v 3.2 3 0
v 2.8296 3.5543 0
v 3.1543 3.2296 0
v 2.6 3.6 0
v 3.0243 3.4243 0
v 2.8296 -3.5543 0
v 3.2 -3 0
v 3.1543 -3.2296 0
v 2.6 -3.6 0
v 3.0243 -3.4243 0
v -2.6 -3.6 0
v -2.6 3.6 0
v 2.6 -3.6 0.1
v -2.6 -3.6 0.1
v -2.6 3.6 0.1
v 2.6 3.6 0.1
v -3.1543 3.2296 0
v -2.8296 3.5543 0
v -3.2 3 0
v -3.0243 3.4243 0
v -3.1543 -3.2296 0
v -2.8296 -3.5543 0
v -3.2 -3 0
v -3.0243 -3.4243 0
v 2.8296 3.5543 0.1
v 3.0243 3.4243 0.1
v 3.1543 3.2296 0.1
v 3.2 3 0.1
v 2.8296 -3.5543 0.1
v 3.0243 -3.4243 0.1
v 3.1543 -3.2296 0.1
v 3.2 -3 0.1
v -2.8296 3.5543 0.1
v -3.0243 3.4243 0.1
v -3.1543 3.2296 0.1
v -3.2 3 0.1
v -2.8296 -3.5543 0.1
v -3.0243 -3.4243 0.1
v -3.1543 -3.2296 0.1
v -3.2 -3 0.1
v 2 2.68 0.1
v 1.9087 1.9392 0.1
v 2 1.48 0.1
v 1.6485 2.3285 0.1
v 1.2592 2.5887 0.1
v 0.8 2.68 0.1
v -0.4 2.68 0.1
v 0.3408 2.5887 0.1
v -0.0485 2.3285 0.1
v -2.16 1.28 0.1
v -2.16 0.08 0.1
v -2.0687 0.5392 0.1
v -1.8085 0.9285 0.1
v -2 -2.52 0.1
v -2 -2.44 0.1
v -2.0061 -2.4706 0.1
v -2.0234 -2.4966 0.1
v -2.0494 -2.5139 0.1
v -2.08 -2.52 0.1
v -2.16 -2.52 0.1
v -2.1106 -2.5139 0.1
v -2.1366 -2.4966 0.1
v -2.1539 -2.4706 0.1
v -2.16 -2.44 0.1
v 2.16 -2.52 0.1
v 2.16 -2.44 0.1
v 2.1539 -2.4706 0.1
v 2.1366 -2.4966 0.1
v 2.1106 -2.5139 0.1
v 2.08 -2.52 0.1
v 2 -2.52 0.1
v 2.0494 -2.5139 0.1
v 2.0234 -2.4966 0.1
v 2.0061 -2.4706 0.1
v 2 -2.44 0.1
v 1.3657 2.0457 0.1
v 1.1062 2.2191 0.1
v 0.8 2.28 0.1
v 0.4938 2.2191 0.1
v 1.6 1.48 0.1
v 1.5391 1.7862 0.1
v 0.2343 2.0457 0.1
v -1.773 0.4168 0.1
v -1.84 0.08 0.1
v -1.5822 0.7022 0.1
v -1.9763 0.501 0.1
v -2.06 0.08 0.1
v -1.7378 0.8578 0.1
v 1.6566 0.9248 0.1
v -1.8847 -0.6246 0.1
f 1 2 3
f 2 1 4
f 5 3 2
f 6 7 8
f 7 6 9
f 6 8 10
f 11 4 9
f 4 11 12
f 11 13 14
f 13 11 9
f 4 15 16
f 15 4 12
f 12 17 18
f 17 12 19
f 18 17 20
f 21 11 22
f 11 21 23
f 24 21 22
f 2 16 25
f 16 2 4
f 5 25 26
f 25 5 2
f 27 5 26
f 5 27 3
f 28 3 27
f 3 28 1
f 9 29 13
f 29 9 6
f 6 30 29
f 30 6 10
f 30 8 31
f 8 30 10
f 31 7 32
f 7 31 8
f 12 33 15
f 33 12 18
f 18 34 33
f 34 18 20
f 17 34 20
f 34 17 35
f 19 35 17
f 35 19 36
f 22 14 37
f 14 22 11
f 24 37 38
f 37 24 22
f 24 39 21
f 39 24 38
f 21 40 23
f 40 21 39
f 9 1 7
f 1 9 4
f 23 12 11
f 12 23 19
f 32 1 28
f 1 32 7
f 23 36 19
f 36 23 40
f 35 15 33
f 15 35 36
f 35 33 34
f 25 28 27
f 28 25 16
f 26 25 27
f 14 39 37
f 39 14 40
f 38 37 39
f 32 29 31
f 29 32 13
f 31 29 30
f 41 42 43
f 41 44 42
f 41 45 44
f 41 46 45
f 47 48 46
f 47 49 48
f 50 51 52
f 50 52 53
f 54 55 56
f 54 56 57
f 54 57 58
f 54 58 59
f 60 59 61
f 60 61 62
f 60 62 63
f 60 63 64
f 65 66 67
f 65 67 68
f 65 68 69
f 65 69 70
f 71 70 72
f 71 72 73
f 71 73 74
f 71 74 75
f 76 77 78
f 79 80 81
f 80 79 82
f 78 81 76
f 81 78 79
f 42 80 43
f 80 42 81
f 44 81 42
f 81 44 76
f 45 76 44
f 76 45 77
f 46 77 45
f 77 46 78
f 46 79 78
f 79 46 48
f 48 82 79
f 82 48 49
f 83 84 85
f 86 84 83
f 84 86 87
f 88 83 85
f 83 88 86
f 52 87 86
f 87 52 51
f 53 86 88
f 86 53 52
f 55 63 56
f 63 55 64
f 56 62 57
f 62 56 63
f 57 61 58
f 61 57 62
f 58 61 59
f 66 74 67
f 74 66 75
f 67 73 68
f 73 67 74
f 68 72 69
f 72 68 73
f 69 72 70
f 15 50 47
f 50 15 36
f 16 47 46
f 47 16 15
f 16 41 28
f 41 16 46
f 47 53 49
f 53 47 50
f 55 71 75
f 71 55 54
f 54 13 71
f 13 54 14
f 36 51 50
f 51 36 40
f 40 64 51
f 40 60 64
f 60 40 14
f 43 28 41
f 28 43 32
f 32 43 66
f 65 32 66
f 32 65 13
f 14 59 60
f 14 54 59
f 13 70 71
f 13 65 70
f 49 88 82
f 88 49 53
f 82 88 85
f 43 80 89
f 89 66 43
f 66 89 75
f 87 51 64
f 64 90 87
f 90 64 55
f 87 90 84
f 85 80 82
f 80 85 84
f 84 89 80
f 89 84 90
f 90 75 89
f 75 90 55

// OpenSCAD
// file: ../p/box3u12.scad
use <../lib.scad>
function ldraw_lib__box3u12() = [
// 0 Box with 3 Parallel Faces without Any Edges
// 0 Name: box3u12.dat
// 0 Author: J.C. Tchang [tchang]
// 0 !LDRAW_ORG Primitive UPDATE 2014-02
// 0 !LICENSE Licensed under CC BY 4.0 : see CAreadme.txt
// 
// 0 BFC CERTIFY CCW
  [0,"BFC","CERTIFY"],
  [0,"BFC","CCW"],
// 
// 0 !HISTORY 2014-12-23 [PTadmin] Official Update 2014-02
// 
// 
// 4 16 -1 1 1 1 1 1 1 1 -1 -1 1 -1
  [4,16,-1,1,1,1,1,1,1,1,-1,-1,1,-1],
// 4 16 -1 1 1 -1 0 1 1 0 1 1 1 1
  [4,16,-1,1,1,-1,0,1,1,0,1,1,1,1],
// 4 16 1 1 -1 1 0 -1 -1 0 -1 -1 1 -1
  [4,16,1,1,-1,1,0,-1,-1,0,-1,-1,1,-1],
];
module ldraw_lib__box3u12(step=0, col=false, unit=2/5, alt=false, line=0.2, solid=!$preview)
    makepoly(ldraw_lib__box3u12(), step=step, col=col, unit=unit, alt=alt, line=line, solid=solid);
ldraw_lib__box3u12(line=0.2);
// file: ../p/1-4cyli.scad
use <../lib.scad>
function ldraw_lib__1_4cyli() = [
// 0 Cylinder 0.25
// 0 Name: 1-4cyli.dat
// 0 Author: James Jessiman
// 0 !LDRAW_ORG Primitive UPDATE 2012-01
// 0 !LICENSE Licensed under CC BY 4.0 : see CAreadme.txt
// 
// 0 BFC CERTIFY CCW
  [0,"BFC","CERTIFY"],
  [0,"BFC","CCW"],
// 
// 0 !HISTORY 2002-03-23 [sbliss] Added BFC statement.
// 0 !HISTORY 2002-04-25 [PTadmin] Official Update 2002-02
// 0 !HISTORY 2007-06-22 [PTadmin] Header formatted for Contributor Agreement
// 0 !HISTORY 2008-07-01 [PTadmin] Official Update 2008-01
// 0 !HISTORY 2012-02-16 [Philo] Changed to CCW
// 0 !HISTORY 2012-03-30 [PTadmin] Official Update 2012-01
// 
// 
// 4 16 1 1 0 0.9239 1 0.3827 0.9239 0 0.3827 1 0 0
  [4,16,1,1,0,0.9239,1,0.3827,0.9239,0,0.3827,1,0,0],
// 5 24 1 0 0 1 1 0 0.9239 0 0.3827 1 0 -1
  [5,24,1,0,0,1,1,0,0.9239,0,0.3827,1,0,-1],
// 4 16 0.9239 1 0.3827 0.7071 1 0.7071 0.7071 0 0.7071 0.9239 0 0.3827
  [4,16,0.9239,1,0.3827,0.7071,1,0.7071,0.7071,0,0.7071,0.9239,0,0.3827],
// 5 24 0.9239 0 0.3827 0.9239 1 0.3827 0.7071 0 0.7071 1 0 0
  [5,24,0.9239,0,0.3827,0.9239,1,0.3827,0.7071,0,0.7071,1,0,0],
// 4 16 0.7071 1 0.7071 0.3827 1 0.9239 0.3827 0 0.9239 0.7071 0 0.7071
  [4,16,0.7071,1,0.7071,0.3827,1,0.9239,0.3827,0,0.9239,0.7071,0,0.7071],
// 5 24 0.7071 0 0.7071 0.7071 1 0.7071 0.3827 0 0.9239 0.9239 0 0.3827
  [5,24,0.7071,0,0.7071,0.7071,1,0.7071,0.3827,0,0.9239,0.9239,0,0.3827],
// 4 16 0.3827 1 0.9239 0 1 1 0 0 1 0.3827 0 0.9239
  [4,16,0.3827,1,0.9239,0,1,1,0,0,1,0.3827,0,0.9239],
// 5 24 0.3827 0 0.9239 0.3827 1 0.9239 0 0 1 0.7071 0 0.7071
  [5,24,0.3827,0,0.9239,0.3827,1,0.9239,0,0,1,0.7071,0,0.7071],
// 5 24 0 0 1 0 1 1 0.3827 0 0.9239 -1 0 1
  [5,24,0,0,1,0,1,1,0.3827,0,0.9239,-1,0,1],
];
module ldraw_lib__1_4cyli(step=0, col=false, unit=2/5, alt=false, line=0.2, solid=!$preview)
    makepoly(ldraw_lib__1_4cyli(), step=step, col=col, unit=unit, alt=alt, line=line, solid=solid);
ldraw_lib__1_4cyli(line=0.2);
// file: s/stickerback008x009.scad
use <../../lib.scad>
use <../../p/1-4chrd.scad>
use <../../p/1-4cyli.scad>
use <../../p/box3u12.scad>
function ldraw_lib__s__stickerback008x009() = [
// 0 ~Sticker Back  0.8 x  0.9
// 0 Name: s\stickerback008x009.dat
// 0 Author: Massimo Maso [Sirio]
// 0 !LDRAW_ORG Subpart UPDATE 2026-05
// 0 !LICENSE Licensed under CC BY 4.0 : see CAreadme.txt
// 
// 0 BFC CERTIFY CCW
  [0,"BFC","CERTIFY"],
  [0,"BFC","CCW"],
// 
// 0 !HISTORY 2025-08-31 [OrionP] Official Update 2025-08
// 0 !HISTORY 2026-04-18 [MagFors] corrected length
// 0 !HISTORY 2026-05-31 [OrionP] Official Update 2026-05
// 
// 0 // Primitives
// 1 16 -7.5 0 6.5 -1.5 0 0 0 -1 0 0 0 1.5 1-4chrd.dat
  [1,16,-7.5,0,6.5,-1.5,0,0,0,-1,0,0,0,1.5, ldraw_lib__1_4chrd()],
// 1 16 7.5 0 6.5 1.5 0 0 0 -1 0 0 0 1.5 1-4chrd.dat
  [1,16,7.5,0,6.5,1.5,0,0,0,-1,0,0,0,1.5, ldraw_lib__1_4chrd()],
// 1 16 0 -.25 0 0 0 9 0 .25 0 6.5 0 0 box3u12.dat
  [1,16,0,-.25,0,0,0,9,0,.25,0,6.5,0,0, ldraw_lib__box3u12()],
// 1 16 -7.5 0 -6.5 -1.5 0 0 0 -1 0 0 0 -1.5 1-4chrd.dat
  [1,16,-7.5,0,-6.5,-1.5,0,0,0,-1,0,0,0,-1.5, ldraw_lib__1_4chrd()],
// 1 16 7.5 0 -6.5 1.5 0 0 0 -1 0 0 0 -1.5 1-4chrd.dat
  [1,16,7.5,0,-6.5,1.5,0,0,0,-1,0,0,0,-1.5, ldraw_lib__1_4chrd()],
// 1 16 -7.5 0 6.5 -1.5 0 0 0 -.25 0 0 0 1.5 1-4cyli.dat
  [1,16,-7.5,0,6.5,-1.5,0,0,0,-.25,0,0,0,1.5, ldraw_lib__1_4cyli()],
// 1 16 7.5 0 6.5 1.5 0 0 0 -.25 0 0 0 1.5 1-4cyli.dat
  [1,16,7.5,0,6.5,1.5,0,0,0,-.25,0,0,0,1.5, ldraw_lib__1_4cyli()],
// 1 16 -7.5 0 -6.5 -1.5 0 0 0 -.25 0 0 0 -1.5 1-4cyli.dat
  [1,16,-7.5,0,-6.5,-1.5,0,0,0,-.25,0,0,0,-1.5, ldraw_lib__1_4cyli()],
// 1 16 7.5 0 -6.5 1.5 0 0 0 -.25 0 0 0 -1.5 1-4cyli.dat
  [1,16,7.5,0,-6.5,1.5,0,0,0,-.25,0,0,0,-1.5, ldraw_lib__1_4cyli()],
// 0 // Bottom face
// 4 16 -7.5 0 8 7.5 0 8 9 0 6.5 -9 0 6.5
  [4,16,-7.5,0,8,7.5,0,8,9,0,6.5,-9,0,6.5],
// 4 16 -7.5 0 -8 -9 0 -6.5 9 0 -6.5 7.5 0 -8
  [4,16,-7.5,0,-8,-9,0,-6.5,9,0,-6.5,7.5,0,-8],
// 0 // Lateral face
// 4 16 -7.5 0 8 -7.5 -.25 8 7.5 -.25 8 7.5 0 8
  [4,16,-7.5,0,8,-7.5,-.25,8,7.5,-.25,8,7.5,0,8],
// 4 16 -7.5 0 -8 7.5 0 -8 7.5 -.25 -8 -7.5 -.25 -8
  [4,16,-7.5,0,-8,7.5,0,-8,7.5,-.25,-8,-7.5,-.25,-8],
];
module ldraw_lib__s__stickerback008x009(step=0, col=false, unit=2/5, alt=false, line=0.2, solid=!$preview)
    makepoly(ldraw_lib__s__stickerback008x009(), step=step, col=col, unit=unit, alt=alt, line=line, solid=solid);
ldraw_lib__s__stickerback008x009(line=0.2);
// file: ../p/3-8ring2.scad
use <../lib.scad>
function ldraw_lib__3_8ring2() = [
// 0 Ring  2 x 0.375
// 0 Name: 3-8ring2.dat
// 0 Author: Willy Tschager [Holly-Wood]
// 0 !LDRAW_ORG Primitive UPDATE 2024-01
// 0 !LICENSE Licensed under CC BY 4.0 : see CAreadme.txt
// 
// 0 BFC CERTIFY CCW
  [0,"BFC","CERTIFY"],
  [0,"BFC","CCW"],
// 
// 0 !HISTORY 2005-12-28 [PTadmin] Official Update 2005-01
// 0 !HISTORY 2007-06-24 [PTadmin] Header formatted for Contributor Agreement
// 0 !HISTORY 2008-07-01 [PTadmin] Official Update 2008-01
// 0 !HISTORY 2024-01-11 [Holly-Wood] Complete regeneration, original by guyvivan
// 0 !HISTORY 2024-01-29 [OrionP] Official Update 2024-01
// 
// 4 16 3 0 0 2.7717 0 1.1481 1.8478 0 0.7654 2 0 0
  [4,16,3,0,0,2.7717,0,1.1481,1.8478,0,0.7654,2,0,0],
// 4 16 2.7717 0 1.1481 2.1213 0 2.1213 1.4142 0 1.4142 1.8478 0 0.7654
  [4,16,2.7717,0,1.1481,2.1213,0,2.1213,1.4142,0,1.4142,1.8478,0,0.7654],
// 4 16 2.1213 0 2.1213 1.1481 0 2.7717 0.7654 0 1.8478 1.4142 0 1.4142
  [4,16,2.1213,0,2.1213,1.1481,0,2.7717,0.7654,0,1.8478,1.4142,0,1.4142],
// 4 16 1.1481 0 2.7717 0 0 3 0 0 2 0.7654 0 1.8478
  [4,16,1.1481,0,2.7717,0,0,3,0,0,2,0.7654,0,1.8478],
// 4 16 0 0 3 -1.1481 0 2.7717 -0.7654 0 1.8478 0 0 2
  [4,16,0,0,3,-1.1481,0,2.7717,-0.7654,0,1.8478,0,0,2],
// 4 16 -1.1481 0 2.7717 -2.1213 0 2.1213 -1.4142 0 1.4142 -0.7654 0 1.8478
  [4,16,-1.1481,0,2.7717,-2.1213,0,2.1213,-1.4142,0,1.4142,-0.7654,0,1.8478],
// 0 // Build by LDPartEditor (PrimGen 2.X)
];
module ldraw_lib__3_8ring2(step=0, col=false, unit=2/5, alt=false, line=0.2, solid=!$preview)
    makepoly(ldraw_lib__3_8ring2(), step=step, col=col, unit=unit, alt=alt, line=line, solid=solid);
ldraw_lib__3_8ring2(line=0.2);
// file: ../p/3-8ndis.scad
use <../lib.scad>
function ldraw_lib__3_8ndis() = [
// 0 Disc Negative 0.375
// 0 Name: 3-8ndis.dat
// 0 Author: Alex Taylor [anathema]
// 0 !LDRAW_ORG Primitive UPDATE 2009-02
// 0 !LICENSE Licensed under CC BY 4.0 : see CAreadme.txt
// 
// 0 BFC CERTIFY CCW
  [0,"BFC","CERTIFY"],
  [0,"BFC","CCW"],
// 
// 0 !HISTORY 2009-09-03 [PTadmin] Official Update 2009-02
// 
// 
// 3 16 1 0 1 0.9239 0 0.3827 1 0 0
  [3,16,1,0,1,0.9239,0,0.3827,1,0,0],
// 3 16 1 0 1 0.7071 0 0.7071 0.9239 0 0.3827
  [3,16,1,0,1,0.7071,0,0.7071,0.9239,0,0.3827],
// 3 16 1 0 1 0.3827 0 0.9239 0.7071 0 0.7071
  [3,16,1,0,1,0.3827,0,0.9239,0.7071,0,0.7071],
// 3 16 1 0 1 0 0 1 0.3827 0 0.9239
  [3,16,1,0,1,0,0,1,0.3827,0,0.9239],
// 3 16 -1 0 1 -0.3827 0 0.9239 0 0 1
  [3,16,-1,0,1,-0.3827,0,0.9239,0,0,1],
// 3 16 -1 0 1 -0.7071 0 0.7071 -0.3827 0 0.9239
  [3,16,-1,0,1,-0.7071,0,0.7071,-0.3827,0,0.9239],
// 0
];
module ldraw_lib__3_8ndis(step=0, col=false, unit=2/5, alt=false, line=0.2, solid=!$preview)
    makepoly(ldraw_lib__3_8ndis(), step=step, col=col, unit=unit, alt=alt, line=line, solid=solid);
ldraw_lib__3_8ndis(line=0.2);
// file: ../p/3-8chrd.scad
use <../lib.scad>
function ldraw_lib__3_8chrd() = [
// 0 Chord 0.375
// 0 Name: 3-8chrd.dat
// 0 Author: Donald Sutter [technog]
// 0 !LDRAW_ORG Primitive UPDATE 2005-01
// 0 !LICENSE Licensed under CC BY 4.0 : see CAreadme.txt
// 
// 0 BFC CERTIFY CCW
  [0,"BFC","CERTIFY"],
  [0,"BFC","CCW"],
// 
// 0 !HISTORY 2004-01-07 [Steffen] added primitive code for POVray
// 0 !HISTORY 2004-03-18 [mkennedy] removed pov code and rearanged polygons.
// 0 !HISTORY 2004-09-12 [cwdee] reversed winding and standardised precision
// 0 !HISTORY 2005-12-28 [PTadmin] Official Update 2005-01
// 0 !HISTORY 2007-06-24 [PTadmin] Header formatted for Contributor Agreement
// 0 !HISTORY 2008-07-01 [PTadmin] Official Update 2008-01
// 
// 
// 3 16 0.7071 0 0.7071 0.3827 0 0.9239 0 0 1
  [3,16,0.7071,0,0.7071,0.3827,0,0.9239,0,0,1],
// 4 16 0.9239 0 0.3827 -0.3827 0 0.9239 -0.7071 0 0.7071 1 0 0
  [4,16,0.9239,0,0.3827,-0.3827,0,0.9239,-0.7071,0,0.7071,1,0,0],
// 4 16 0.7071 0 0.7071 0 0 1 -0.3827 0 0.9239 0.9239 0 0.3827
  [4,16,0.7071,0,0.7071,0,0,1,-0.3827,0,0.9239,0.9239,0,0.3827],
// 0
];
module ldraw_lib__3_8chrd(step=0, col=false, unit=2/5, alt=false, line=0.2, solid=!$preview)
    makepoly(ldraw_lib__3_8chrd(), step=step, col=col, unit=unit, alt=alt, line=line, solid=solid);
ldraw_lib__3_8chrd(line=0.2);
// file: ../p/2-4ndis.scad
use <../lib.scad>
function ldraw_lib__2_4ndis() = [
// 0 Disc Negative 0.5
// 0 Name: 2-4ndis.dat
// 0 Author: James Jessiman
// 0 !LDRAW_ORG Primitive UPDATE 2012-01
// 0 !LICENSE Licensed under CC BY 4.0 : see CAreadme.txt
// 
// 0 BFC CERTIFY CCW
  [0,"BFC","CERTIFY"],
  [0,"BFC","CCW"],
// 
// 0 !HISTORY 2002-03-23 [sbliss] Added BFC statement; compacted code
// 0 !HISTORY 2002-04-25 [PTadmin] Official Update 2002-02
// 0 !HISTORY 2007-06-24 [PTadmin] Header formatted for Contributor Agreement
// 0 !HISTORY 2008-07-01 [PTadmin] Official Update 2008-01
// 0 !HISTORY 2012-02-16 [Philo] Changed to CCW
// 0 !HISTORY 2012-03-30 [PTadmin] Official Update 2012-01
// 
// 
// 3 16 0.9239 0 0.3827 1 0 0 1 0 1
  [3,16,0.9239,0,0.3827,1,0,0,1,0,1],
// 3 16 0.7071 0 0.7071 0.9239 0 0.3827 1 0 1
  [3,16,0.7071,0,0.7071,0.9239,0,0.3827,1,0,1],
// 3 16 0.3827 0 0.9239 0.7071 0 0.7071 1 0 1
  [3,16,0.3827,0,0.9239,0.7071,0,0.7071,1,0,1],
// 3 16 0 0 1 0.3827 0 0.9239 1 0 1
  [3,16,0,0,1,0.3827,0,0.9239,1,0,1],
// 3 16 -0.3827 0 0.9239 0 0 1 -1 0 1
  [3,16,-0.3827,0,0.9239,0,0,1,-1,0,1],
// 3 16 -0.7071 0 0.7071 -0.3827 0 0.9239 -1 0 1
  [3,16,-0.7071,0,0.7071,-0.3827,0,0.9239,-1,0,1],
// 3 16 -0.9239 0 0.3827 -0.7071 0 0.7071 -1 0 1
  [3,16,-0.9239,0,0.3827,-0.7071,0,0.7071,-1,0,1],
// 3 16 -1 0 0 -0.9239 0 0.3827 -1 0 1
  [3,16,-1,0,0,-0.9239,0,0.3827,-1,0,1],
];
module ldraw_lib__2_4ndis(step=0, col=false, unit=2/5, alt=false, line=0.2, solid=!$preview)
    makepoly(ldraw_lib__2_4ndis(), step=step, col=col, unit=unit, alt=alt, line=line, solid=solid);
ldraw_lib__2_4ndis(line=0.2);
// file: ../p/2-4chrd.scad
use <../lib.scad>
function ldraw_lib__2_4chrd() = [
// 0 Chord 0.5
// 0 Name: 2-4chrd.dat
// 0 Author: Philippe Hurbain [Philo]
// 0 !LDRAW_ORG Primitive UPDATE 2014-01
// 0 !LICENSE Licensed under CC BY 4.0 : see CAreadme.txt
// 
// 0 BFC CERTIFY CCW
  [0,"BFC","CERTIFY"],
  [0,"BFC","CCW"],
// 
// 0 !HISTORY 2014-06-21 [PTadmin] Official Update 2014-01
// 
// 
// 4 16 0.9239 0 0.3827 -0.9239 0 0.3827 -1 0 0 1 0 0
  [4,16,0.9239,0,0.3827,-0.9239,0,0.3827,-1,0,0,1,0,0],
// 4 16 0.7071 0 0.7071 -0.7071 0 0.7071 -0.9239 0 0.3827 0.9239 0 0.3827
  [4,16,0.7071,0,0.7071,-0.7071,0,0.7071,-0.9239,0,0.3827,0.9239,0,0.3827],
// 4 16 0.3827 0 0.9239 -0.3827 0 0.9239 -0.7071 0 0.7071 0.7071 0 0.7071
  [4,16,0.3827,0,0.9239,-0.3827,0,0.9239,-0.7071,0,0.7071,0.7071,0,0.7071],
// 3 16 0 0 1 -0.3827 0 0.9239 0.3827 0 0.9239
  [3,16,0,0,1,-0.3827,0,0.9239,0.3827,0,0.9239],
];
module ldraw_lib__2_4chrd(step=0, col=false, unit=2/5, alt=false, line=0.2, solid=!$preview)
    makepoly(ldraw_lib__2_4chrd(), step=step, col=col, unit=unit, alt=alt, line=line, solid=solid);
ldraw_lib__2_4chrd(line=0.2);
// file: ../p/1-8ring4.scad
use <../lib.scad>
function ldraw_lib__1_8ring4() = [
// 0 Ring  4 x 0.125
// 0 Name: 1-8ring4.dat
// 0 Author: Willy Tschager [Holly-Wood]
// 0 !LDRAW_ORG Primitive UPDATE 2024-01
// 0 !LICENSE Licensed under CC BY 4.0 : see CAreadme.txt
// 
// 0 BFC CERTIFY CCW
  [0,"BFC","CERTIFY"],
  [0,"BFC","CCW"],
// 
// 0 !HISTORY 2005-12-28 [PTadmin] Official Update 2005-01
// 0 !HISTORY 2007-06-22 [PTadmin] Header formatted for Contributor Agreement
// 0 !HISTORY 2008-07-01 [PTadmin] Official Update 2008-01
// 0 !HISTORY 2024-01-14 [Holly-Wood] Complete regeneration, original by guyvivan
// 0 !HISTORY 2024-01-29 [OrionP] Official Update 2024-01
// 
// 4 16 5 0 0 4.6195 0 1.9135 3.6956 0 1.5308 4 0 0
  [4,16,5,0,0,4.6195,0,1.9135,3.6956,0,1.5308,4,0,0],
// 4 16 4.6195 0 1.9135 3.5355 0 3.5355 2.8284 0 2.8284 3.6956 0 1.5308
  [4,16,4.6195,0,1.9135,3.5355,0,3.5355,2.8284,0,2.8284,3.6956,0,1.5308],
// 0 // Build by LDPartEditor (PrimGen 2.X)
];
module ldraw_lib__1_8ring4(step=0, col=false, unit=2/5, alt=false, line=0.2, solid=!$preview)
    makepoly(ldraw_lib__1_8ring4(), step=step, col=col, unit=unit, alt=alt, line=line, solid=solid);
ldraw_lib__1_8ring4(line=0.2);
// file: ../p/1-8ring11.scad
use <../lib.scad>
function ldraw_lib__1_8ring11() = [
// 0 Ring 11 x 0.125
// 0 Name: 1-8ring11.dat
// 0 Author: Magnus Forsberg [MagFors]
// 0 !LDRAW_ORG Primitive UPDATE 2022-02
// 0 !LICENSE Licensed under CC BY 4.0 : see CAreadme.txt
// 
// 0 BFC CERTIFY CCW
  [0,"BFC","CERTIFY"],
  [0,"BFC","CCW"],
// 
// 0 !HISTORY 2022-03-06 [PTadmin] Official Update 2022-02
// 
// 
// 4 16 12 0 0 11.0868 0 4.5924 10.1629 0 4.2097 11 0 0
  [4,16,12,0,0,11.0868,0,4.5924,10.1629,0,4.2097,11,0,0],
// 4 16 11.0868 0 4.5924 8.4852 0 8.4852 7.7781 0 7.7781 10.1629 0 4.2097
  [4,16,11.0868,0,4.5924,8.4852,0,8.4852,7.7781,0,7.7781,10.1629,0,4.2097],
// 0 // Build by Primitive Generator 2
];
module ldraw_lib__1_8ring11(step=0, col=false, unit=2/5, alt=false, line=0.2, solid=!$preview)
    makepoly(ldraw_lib__1_8ring11(), step=step, col=col, unit=unit, alt=alt, line=line, solid=solid);
ldraw_lib__1_8ring11(line=0.2);
// file: ../p/1-8ndis.scad
use <../lib.scad>
function ldraw_lib__1_8ndis() = [
// 0 Disc Negative 0.125
// 0 Name: 1-8ndis.dat
// 0 Author: James Jessiman
// 0 !LDRAW_ORG Primitive UPDATE 2012-01
// 0 !LICENSE Licensed under CC BY 4.0 : see CAreadme.txt
// 
// 0 BFC CERTIFY CCW
  [0,"BFC","CERTIFY"],
  [0,"BFC","CCW"],
// 
// 0 !HISTORY 2002-03-23 [sbliss] Added BFC statement
// 0 !HISTORY 2002-04-25 [PTadmin] Official Update 2002-02
// 0 !HISTORY 2007-06-22 [PTadmin] Header formatted for Contributor Agreement
// 0 !HISTORY 2008-07-01 [PTadmin] Official Update 2008-01
// 0 !HISTORY 2012-02-16 [Philo] Changed to CCW
// 0 !HISTORY 2012-03-30 [PTadmin] Official Update 2012-01
// 
// 
// 3 16 0.9239 0 0.3827 1 0 0 1 0 1
  [3,16,0.9239,0,0.3827,1,0,0,1,0,1],
// 3 16 0.7071 0 0.7071 0.9239 0 0.3827 1 0 1
  [3,16,0.7071,0,0.7071,0.9239,0,0.3827,1,0,1],
];
module ldraw_lib__1_8ndis(step=0, col=false, unit=2/5, alt=false, line=0.2, solid=!$preview)
    makepoly(ldraw_lib__1_8ndis(), step=step, col=col, unit=unit, alt=alt, line=line, solid=solid);
ldraw_lib__1_8ndis(line=0.2);
// file: ../p/1-8chrd.scad
use <../lib.scad>
function ldraw_lib__1_8chrd() = [
// 0 Chord 0.125
// 0 Name: 1-8chrd.dat
// 0 Author: Orion Pobursky [OrionP]
// 0 !LDRAW_ORG Primitive UPDATE 2023-05
// 0 !LICENSE Licensed under CC BY 4.0 : see CAreadme.txt
// 
// 0 BFC CERTIFY CCW
  [0,"BFC","CERTIFY"],
  [0,"BFC","CCW"],
// 
// 0 !HISTORY 2004-04-22 [PTadmin] Official Update 2004-02
// 0 !HISTORY 2007-06-22 [PTadmin] Header formatted for Contributor Agreement
// 0 !HISTORY 2008-07-01 [PTadmin] Official Update 2008-01
// 0 !HISTORY 2023-10-27 [OrionP] Rebuilt with PrimGen2, original author westrate
// 0 !HISTORY 2023-10-31 [OrionP] Official Update 2023-05
// 
// 3 16 1 0 0 0.9239 0 0.3827 0.7071 0 0.7071
  [3,16,1,0,0,0.9239,0,0.3827,0.7071,0,0.7071],
];
module ldraw_lib__1_8chrd(step=0, col=false, unit=2/5, alt=false, line=0.2, solid=!$preview)
    makepoly(ldraw_lib__1_8chrd(), step=step, col=col, unit=unit, alt=alt, line=line, solid=solid);
ldraw_lib__1_8chrd(line=0.2);
// file: ../p/1-4chrd.scad
use <../lib.scad>
function ldraw_lib__1_4chrd() = [
// 0 Chord 0.25
// 0 Name: 1-4chrd.dat
// 0 Author: Max Martin Richter [MMR1988]
// 0 !LDRAW_ORG Primitive UPDATE 2023-05
// 0 !LICENSE Licensed under CC BY 4.0 : see CAreadme.txt
// 
// 0 BFC CERTIFY CCW
  [0,"BFC","CERTIFY"],
  [0,"BFC","CCW"],
// 
// 0 !HISTORY 2004-04-22 [PTadmin] Official Update 2004-02
// 0 !HISTORY 2007-10-09 [PTadmin] Header formatted for Contributor Agreement
// 0 !HISTORY 2008-07-01 [PTadmin] Official Update 2008-01
// 0 !HISTORY 2012-08-02 [MMR1988] Re-creation with PrimGen2 and Rectifier
// 0 !HISTORY 2012-08-09 [PTadmin] Official Update 2012-02
// 0 !HISTORY 2023-10-27 [OrionP] Change author to MMR1988 from hafhead
// 0 !HISTORY 2023-10-31 [OrionP] Official Update 2023-05
// 
// 4 16 0.9239 0 0.3827 0.3827 0 0.9239 0 0 1 1 0 0
  [4,16,0.9239,0,0.3827,0.3827,0,0.9239,0,0,1,1,0,0],
// 3 16 0.7071 0 0.7071 0.3827 0 0.9239 0.9239 0 0.3827
  [3,16,0.7071,0,0.7071,0.3827,0,0.9239,0.9239,0,0.3827],
];
module ldraw_lib__1_4chrd(step=0, col=false, unit=2/5, alt=false, line=0.2, solid=!$preview)
    makepoly(ldraw_lib__1_4chrd(), step=step, col=col, unit=unit, alt=alt, line=line, solid=solid);
ldraw_lib__1_4chrd(line=0.2);
// main file
use <../lib.scad>
use <../p/1-4chrd.scad>
use <../p/1-8chrd.scad>
use <../p/1-8ndis.scad>
use <../p/1-8ring11.scad>
use <../p/1-8ring4.scad>
use <../p/2-4chrd.scad>
use <../p/2-4ndis.scad>
use <../p/3-8chrd.scad>
use <../p/3-8ndis.scad>
use <../p/3-8ring2.scad>
use <s/stickerback008x009.scad>
function ldraw_lib__6177741c() = [
// 0 Sticker  0.9 x  0.8 with Black Air Scope on Transparent Background Right (Needs Work)
// 0 Name: 6177741c.dat
// 0 Author: Massimo Maso [Sirio]
// 0 !LDRAW_ORG Part UPDATE 2026-09
// 0 !LICENSE Licensed under CC BY 4.0 : see CAreadme.txt
// 
// 0 !HELP Needs work: halftone areas are simplified because no high-resolution images are available
// 
// 0 BFC CERTIFY CCW
  [0,"BFC","CERTIFY"],
  [0,"BFC","CCW"],
// 
// 0 !CATEGORY Sticker
// 0 !KEYWORDS AMG, BrickLink 75877stk01, Brickowl 538042, GT3, Mercedes
// 0 !KEYWORDS Rebrickable 30844, Set 75877, Speed Champions
// 
// 0 !HISTORY 2025-05-28 [OrionP] Official Update 2025-05
// 0 !HISTORY 2026-04-17 [Sirio] Introduced stickerback and adapted top face
// 0 !HISTORY 2026-09-30 [OrionP] Official Update 2026-09
// 
// 0 // Stickerback
// 1 16 0 0 0 0 0 1 0 1 0 -1 0 0 s\stickerback008x009.dat
  [1,16,0,0,0,0,0,1,0,1,0,-1,0,0, ldraw_lib__s__stickerback008x009()],
// 0 // Primitives
// 1 16 -6.5 -.25 7.5 -1.5 0 0 0 1 0 0 0 1.5 1-4chrd.dat
  [1,16,-6.5,-.25,7.5,-1.5,0,0,0,1,0,0,0,1.5, ldraw_lib__1_4chrd()],
// 1 16 6.5 -.25 7.5 1.5 0 0 0 1 0 0 0 1.5 1-4chrd.dat
  [1,16,6.5,-.25,7.5,1.5,0,0,0,1,0,0,0,1.5, ldraw_lib__1_4chrd()],
// 1 16 -6.5 -.25 -7.5 -1.5 0 0 0 1 0 0 0 -1.5 1-4chrd.dat
  [1,16,-6.5,-.25,-7.5,-1.5,0,0,0,1,0,0,0,-1.5, ldraw_lib__1_4chrd()],
// 1 16 6.5 -.25 -7.5 1.5 0 0 0 1 0 0 0 -1.5 1-4chrd.dat
  [1,16,6.5,-.25,-7.5,1.5,0,0,0,1,0,0,0,-1.5, ldraw_lib__1_4chrd()],
// 1 16 2 -.25 3.7 3 0 0 0 1 0 0 0 3 3-8ndis.dat
  [1,16,2,-.25,3.7,3,0,0,0,1,0,0,0,3, ldraw_lib__3_8ndis()],
// 1 16 -2.4 -.25 .2 -3 0 0 0 1 0 0 0 3 1-8ndis.dat
  [1,16,-2.4,-.25,.2,-3,0,0,0,1,0,0,0,3, ldraw_lib__1_8ndis()],
// 1 16 -5.2 -.25 -6.1 .2 0 0 0 1 0 0 0 -.2 2-4ndis.dat
  [1,16,-5.2,-.25,-6.1,.2,0,0,0,1,0,0,0,-.2, ldraw_lib__2_4ndis()],
// 1 16 5.2 -.25 -6.1 .2 0 0 0 1 0 0 0 -.2 2-4ndis.dat
  [1,16,5.2,-.25,-6.1,.2,0,0,0,1,0,0,0,-.2, ldraw_lib__2_4ndis()],
// 0 BFC NOCLIP
  [0,"BFC","NOCLIP"],
// 1 72 2 -.25 3.7 2 0 0 0 1 0 0 0 2 3-8chrd.dat
  [1,72,2,-.25,3.7,2,0,0,0,1,0,0,0,2, ldraw_lib__3_8chrd()],
// 1 0 2 -.25 3.7 1 0 0 0 1 0 0 0 1 3-8ring2.dat
  [1,0,2,-.25,3.7,1,0,0,0,1,0,0,0,1, ldraw_lib__3_8ring2()],
// 1 72 -2.4 -.25 .2 -2.2 0 0 0 1 0 0 0 2.2 1-8chrd.dat
  [1,72,-2.4,-.25,.2,-2.2,0,0,0,1,0,0,0,2.2, ldraw_lib__1_8chrd()],
// 1 0 -2.4 -.25 .2 -.55 0 0 0 1 0 0 0 .55 1-8ring4.dat
  [1,0,-2.4,-.25,.2,-.55,0,0,0,1,0,0,0,.55, ldraw_lib__1_8ring4()],
// 1 0 -2.4 -.25 .2 -.25 0 0 0 1 0 0 0 .25 1-8ring11.dat
  [1,0,-2.4,-.25,.2,-.25,0,0,0,1,0,0,0,.25, ldraw_lib__1_8ring11()],
// 1 0 -5.2 -.25 -6.1 .2 0 0 0 1 0 0 0 -.2 2-4chrd.dat
  [1,0,-5.2,-.25,-6.1,.2,0,0,0,1,0,0,0,-.2, ldraw_lib__2_4chrd()],
// 1 0 5.2 -.25 -6.1 .2 0 0 0 1 0 0 0 -.2 2-4chrd.dat
  [1,0,5.2,-.25,-6.1,.2,0,0,0,1,0,0,0,-.2, ldraw_lib__2_4chrd()],
// 0 BFC CLIP
  [0,"BFC","CLIP"],
// 0 // Top face
// 0 // Transparent faces
// 4 16 -6.5 -.25 9 -8 -.25 7.5 -5.4 -.25 3.2 -1 -.25 6.7
  [4,16,-6.5,-.25,9,-8,-.25,7.5,-5.4,-.25,3.2,-1,-.25,6.7],
// 4 16 -6.5 -.25 9 -1 -.25 6.7 2 -.25 6.7 6.5 -.25 9
  [4,16,-6.5,-.25,9,-1,-.25,6.7,2,-.25,6.7,6.5,-.25,9],
// 4 16 6.5 -.25 9 2 -.25 6.7 5 -.25 6.7 8 -.25 7.5
  [4,16,6.5,-.25,9,2,-.25,6.7,5,-.25,6.7,8,-.25,7.5],
// 4 16 -1 -.25 6.7 -5.4 -.25 3.2 -4.5213 -.25 2.3213 -.1213 -.25 5.8213
  [4,16,-1,-.25,6.7,-5.4,-.25,3.2,-4.5213,-.25,2.3213,-.1213,-.25,5.8213],
// 4 16 -5 -.25 -6.3 5 -.25 -6.3 5 -.25 -6.1 -5 -.25 -6.1
  [4,16,-5,-.25,-6.3,5,-.25,-6.3,5,-.25,-6.1,-5,-.25,-6.1],
// 4 16 -5 -.25 -6.3 -6.5 -.25 -9 6.5 -.25 -9 5 -.25 -6.3
  [4,16,-5,-.25,-6.3,-6.5,-.25,-9,6.5,-.25,-9,5,-.25,-6.3],
// 4 16 -8 -.25 7.5 -8 -.25 -7.5 -5.4 -.25 .2 -5.4 -.25 3.2
  [4,16,-8,-.25,7.5,-8,-.25,-7.5,-5.4,-.25,.2,-5.4,-.25,3.2],
// 3 16 -8 -.25 -7.5 -5.4 -.25 -6.1 -5.4 -.25 .2
  [3,16,-8,-.25,-7.5,-5.4,-.25,-6.1,-5.4,-.25,.2],
// 4 16 -8 -.25 -7.5 -6.5 -.25 -9 -5.4 -.25 -6.3 -5.4 -.25 -6.1
  [4,16,-8,-.25,-7.5,-6.5,-.25,-9,-5.4,-.25,-6.3,-5.4,-.25,-6.1],
// 4 16 8 -.25 7.5 5 -.25 6.7 5 -.25 3.7 8 -.25 -7.5
  [4,16,8,-.25,7.5,5,-.25,6.7,5,-.25,3.7,8,-.25,-7.5],
// 3 16 8 -.25 -7.5 5 -.25 3.7 5.4 -.25 -6.1
  [3,16,8,-.25,-7.5,5,-.25,3.7,5.4,-.25,-6.1],
// 4 16 8 -.25 -7.5 5.4 -.25 -6.1 5.4 -.25 -6.3 6.5 -.25 -9
  [4,16,8,-.25,-7.5,5.4,-.25,-6.1,5.4,-.25,-6.3,6.5,-.25,-9],
// 3 16 -6.5 -.25 -9 -5.2 -.25 -6.3 -5.4 -.25 -6.3
  [3,16,-6.5,-.25,-9,-5.2,-.25,-6.3,-5.4,-.25,-6.3],
// 3 16 -6.5 -.25 -9 -5 -.25 -6.3 -5.2 -.25 -6.3
  [3,16,-6.5,-.25,-9,-5,-.25,-6.3,-5.2,-.25,-6.3],
// 3 16 6.5 -.25 -9 5.2 -.25 -6.3 5 -.25 -6.3
  [3,16,6.5,-.25,-9,5.2,-.25,-6.3,5,-.25,-6.3],
// 3 16 6.5 -.25 -9 5.4 -.25 -6.3 5.2 -.25 -6.3
  [3,16,6.5,-.25,-9,5.4,-.25,-6.3,5.2,-.25,-6.3],
// 0 BFC NOCLIP
  [0,"BFC","NOCLIP"],
// 0 // Black frame faces
// 4 0 .5858 -.25 5.1142 -.1213 -.25 5.8213 -4.5213 -.25 2.3213 -4.3445 -.25 2.1445
  [4,0,.5858,-.25,5.1142,-.1213,-.25,5.8213,-4.5213,-.25,2.3213,-4.3445,-.25,2.1445],
// 3 0 .5858 -.25 5.1142 -4.3445 -.25 2.1445 -3.9556 -.25 1.7556
  [3,0,.5858,-.25,5.1142,-4.3445,-.25,2.1445,-3.9556,-.25,1.7556],
// 3 0 5 -.25 3.7 4 -.25 3.7 4.1416 -.25 2.312
  [3,0,5,-.25,3.7,4,-.25,3.7,4.1416,-.25,2.312],
// 4 0 5 -.25 3.7 4.1416 -.25 2.312 5 -.25 -6.1 5.4 -.25 -6.1
  [4,0,5,-.25,3.7,4.1416,-.25,2.312,5,-.25,-6.1,5.4,-.25,-6.1],
// 3 0 -5.15 -.25 .2 -5.4 -.25 .2 -5.4 -.25 -6.1
  [3,0,-5.15,-.25,.2,-5.4,-.25,.2,-5.4,-.25,-6.1],
// 4 0 -5.15 -.25 .2 -5.4 -.25 -6.1 -5 -.25 -6.1 -4.7118 -.25 -1.5614
  [4,0,-5.15,-.25,.2,-5.4,-.25,-6.1,-5,-.25,-6.1,-4.7118,-.25,-1.5614],
// 3 0 -5.15 -.25 .2 -4.7118 -.25 -1.5614 -4.6 -.25 .2
  [3,0,-5.15,-.25,.2,-4.7118,-.25,-1.5614,-4.6,-.25,.2],
// 0 // Halftone faces (actually 16 ndis and 0 disc)
// 4 72 4 -.25 3.7 .5858 -.25 5.1142 -3.9556 -.25 1.7556 -4.6 -.25 .2
  [4,72,4,-.25,3.7,.5858,-.25,5.1142,-3.9556,-.25,1.7556,-4.6,-.25,.2],
// 4 72 4 -.25 3.7 -4.6 -.25 .2 -4.7118 -.25 -1.5614 4.1416 -.25 2.312
  [4,72,4,-.25,3.7,-4.6,-.25,.2,-4.7118,-.25,-1.5614,4.1416,-.25,2.312],
// 4 71 -5 -.25 -6.1 5 -.25 -6.1 4.1416 -.25 2.312 -4.7118 -.25 -1.5614
  [4,71,-5,-.25,-6.1,5,-.25,-6.1,4.1416,-.25,2.312,-4.7118,-.25,-1.5614],
];
module ldraw_lib__6177741c(step=0, col=false, unit=2/5, alt=false, line=0.2, solid=!$preview)
    makepoly(ldraw_lib__6177741c(), step=step, col=col, unit=unit, alt=alt, line=line, solid=solid);
ldraw_lib__6177741c(line=0.2);
